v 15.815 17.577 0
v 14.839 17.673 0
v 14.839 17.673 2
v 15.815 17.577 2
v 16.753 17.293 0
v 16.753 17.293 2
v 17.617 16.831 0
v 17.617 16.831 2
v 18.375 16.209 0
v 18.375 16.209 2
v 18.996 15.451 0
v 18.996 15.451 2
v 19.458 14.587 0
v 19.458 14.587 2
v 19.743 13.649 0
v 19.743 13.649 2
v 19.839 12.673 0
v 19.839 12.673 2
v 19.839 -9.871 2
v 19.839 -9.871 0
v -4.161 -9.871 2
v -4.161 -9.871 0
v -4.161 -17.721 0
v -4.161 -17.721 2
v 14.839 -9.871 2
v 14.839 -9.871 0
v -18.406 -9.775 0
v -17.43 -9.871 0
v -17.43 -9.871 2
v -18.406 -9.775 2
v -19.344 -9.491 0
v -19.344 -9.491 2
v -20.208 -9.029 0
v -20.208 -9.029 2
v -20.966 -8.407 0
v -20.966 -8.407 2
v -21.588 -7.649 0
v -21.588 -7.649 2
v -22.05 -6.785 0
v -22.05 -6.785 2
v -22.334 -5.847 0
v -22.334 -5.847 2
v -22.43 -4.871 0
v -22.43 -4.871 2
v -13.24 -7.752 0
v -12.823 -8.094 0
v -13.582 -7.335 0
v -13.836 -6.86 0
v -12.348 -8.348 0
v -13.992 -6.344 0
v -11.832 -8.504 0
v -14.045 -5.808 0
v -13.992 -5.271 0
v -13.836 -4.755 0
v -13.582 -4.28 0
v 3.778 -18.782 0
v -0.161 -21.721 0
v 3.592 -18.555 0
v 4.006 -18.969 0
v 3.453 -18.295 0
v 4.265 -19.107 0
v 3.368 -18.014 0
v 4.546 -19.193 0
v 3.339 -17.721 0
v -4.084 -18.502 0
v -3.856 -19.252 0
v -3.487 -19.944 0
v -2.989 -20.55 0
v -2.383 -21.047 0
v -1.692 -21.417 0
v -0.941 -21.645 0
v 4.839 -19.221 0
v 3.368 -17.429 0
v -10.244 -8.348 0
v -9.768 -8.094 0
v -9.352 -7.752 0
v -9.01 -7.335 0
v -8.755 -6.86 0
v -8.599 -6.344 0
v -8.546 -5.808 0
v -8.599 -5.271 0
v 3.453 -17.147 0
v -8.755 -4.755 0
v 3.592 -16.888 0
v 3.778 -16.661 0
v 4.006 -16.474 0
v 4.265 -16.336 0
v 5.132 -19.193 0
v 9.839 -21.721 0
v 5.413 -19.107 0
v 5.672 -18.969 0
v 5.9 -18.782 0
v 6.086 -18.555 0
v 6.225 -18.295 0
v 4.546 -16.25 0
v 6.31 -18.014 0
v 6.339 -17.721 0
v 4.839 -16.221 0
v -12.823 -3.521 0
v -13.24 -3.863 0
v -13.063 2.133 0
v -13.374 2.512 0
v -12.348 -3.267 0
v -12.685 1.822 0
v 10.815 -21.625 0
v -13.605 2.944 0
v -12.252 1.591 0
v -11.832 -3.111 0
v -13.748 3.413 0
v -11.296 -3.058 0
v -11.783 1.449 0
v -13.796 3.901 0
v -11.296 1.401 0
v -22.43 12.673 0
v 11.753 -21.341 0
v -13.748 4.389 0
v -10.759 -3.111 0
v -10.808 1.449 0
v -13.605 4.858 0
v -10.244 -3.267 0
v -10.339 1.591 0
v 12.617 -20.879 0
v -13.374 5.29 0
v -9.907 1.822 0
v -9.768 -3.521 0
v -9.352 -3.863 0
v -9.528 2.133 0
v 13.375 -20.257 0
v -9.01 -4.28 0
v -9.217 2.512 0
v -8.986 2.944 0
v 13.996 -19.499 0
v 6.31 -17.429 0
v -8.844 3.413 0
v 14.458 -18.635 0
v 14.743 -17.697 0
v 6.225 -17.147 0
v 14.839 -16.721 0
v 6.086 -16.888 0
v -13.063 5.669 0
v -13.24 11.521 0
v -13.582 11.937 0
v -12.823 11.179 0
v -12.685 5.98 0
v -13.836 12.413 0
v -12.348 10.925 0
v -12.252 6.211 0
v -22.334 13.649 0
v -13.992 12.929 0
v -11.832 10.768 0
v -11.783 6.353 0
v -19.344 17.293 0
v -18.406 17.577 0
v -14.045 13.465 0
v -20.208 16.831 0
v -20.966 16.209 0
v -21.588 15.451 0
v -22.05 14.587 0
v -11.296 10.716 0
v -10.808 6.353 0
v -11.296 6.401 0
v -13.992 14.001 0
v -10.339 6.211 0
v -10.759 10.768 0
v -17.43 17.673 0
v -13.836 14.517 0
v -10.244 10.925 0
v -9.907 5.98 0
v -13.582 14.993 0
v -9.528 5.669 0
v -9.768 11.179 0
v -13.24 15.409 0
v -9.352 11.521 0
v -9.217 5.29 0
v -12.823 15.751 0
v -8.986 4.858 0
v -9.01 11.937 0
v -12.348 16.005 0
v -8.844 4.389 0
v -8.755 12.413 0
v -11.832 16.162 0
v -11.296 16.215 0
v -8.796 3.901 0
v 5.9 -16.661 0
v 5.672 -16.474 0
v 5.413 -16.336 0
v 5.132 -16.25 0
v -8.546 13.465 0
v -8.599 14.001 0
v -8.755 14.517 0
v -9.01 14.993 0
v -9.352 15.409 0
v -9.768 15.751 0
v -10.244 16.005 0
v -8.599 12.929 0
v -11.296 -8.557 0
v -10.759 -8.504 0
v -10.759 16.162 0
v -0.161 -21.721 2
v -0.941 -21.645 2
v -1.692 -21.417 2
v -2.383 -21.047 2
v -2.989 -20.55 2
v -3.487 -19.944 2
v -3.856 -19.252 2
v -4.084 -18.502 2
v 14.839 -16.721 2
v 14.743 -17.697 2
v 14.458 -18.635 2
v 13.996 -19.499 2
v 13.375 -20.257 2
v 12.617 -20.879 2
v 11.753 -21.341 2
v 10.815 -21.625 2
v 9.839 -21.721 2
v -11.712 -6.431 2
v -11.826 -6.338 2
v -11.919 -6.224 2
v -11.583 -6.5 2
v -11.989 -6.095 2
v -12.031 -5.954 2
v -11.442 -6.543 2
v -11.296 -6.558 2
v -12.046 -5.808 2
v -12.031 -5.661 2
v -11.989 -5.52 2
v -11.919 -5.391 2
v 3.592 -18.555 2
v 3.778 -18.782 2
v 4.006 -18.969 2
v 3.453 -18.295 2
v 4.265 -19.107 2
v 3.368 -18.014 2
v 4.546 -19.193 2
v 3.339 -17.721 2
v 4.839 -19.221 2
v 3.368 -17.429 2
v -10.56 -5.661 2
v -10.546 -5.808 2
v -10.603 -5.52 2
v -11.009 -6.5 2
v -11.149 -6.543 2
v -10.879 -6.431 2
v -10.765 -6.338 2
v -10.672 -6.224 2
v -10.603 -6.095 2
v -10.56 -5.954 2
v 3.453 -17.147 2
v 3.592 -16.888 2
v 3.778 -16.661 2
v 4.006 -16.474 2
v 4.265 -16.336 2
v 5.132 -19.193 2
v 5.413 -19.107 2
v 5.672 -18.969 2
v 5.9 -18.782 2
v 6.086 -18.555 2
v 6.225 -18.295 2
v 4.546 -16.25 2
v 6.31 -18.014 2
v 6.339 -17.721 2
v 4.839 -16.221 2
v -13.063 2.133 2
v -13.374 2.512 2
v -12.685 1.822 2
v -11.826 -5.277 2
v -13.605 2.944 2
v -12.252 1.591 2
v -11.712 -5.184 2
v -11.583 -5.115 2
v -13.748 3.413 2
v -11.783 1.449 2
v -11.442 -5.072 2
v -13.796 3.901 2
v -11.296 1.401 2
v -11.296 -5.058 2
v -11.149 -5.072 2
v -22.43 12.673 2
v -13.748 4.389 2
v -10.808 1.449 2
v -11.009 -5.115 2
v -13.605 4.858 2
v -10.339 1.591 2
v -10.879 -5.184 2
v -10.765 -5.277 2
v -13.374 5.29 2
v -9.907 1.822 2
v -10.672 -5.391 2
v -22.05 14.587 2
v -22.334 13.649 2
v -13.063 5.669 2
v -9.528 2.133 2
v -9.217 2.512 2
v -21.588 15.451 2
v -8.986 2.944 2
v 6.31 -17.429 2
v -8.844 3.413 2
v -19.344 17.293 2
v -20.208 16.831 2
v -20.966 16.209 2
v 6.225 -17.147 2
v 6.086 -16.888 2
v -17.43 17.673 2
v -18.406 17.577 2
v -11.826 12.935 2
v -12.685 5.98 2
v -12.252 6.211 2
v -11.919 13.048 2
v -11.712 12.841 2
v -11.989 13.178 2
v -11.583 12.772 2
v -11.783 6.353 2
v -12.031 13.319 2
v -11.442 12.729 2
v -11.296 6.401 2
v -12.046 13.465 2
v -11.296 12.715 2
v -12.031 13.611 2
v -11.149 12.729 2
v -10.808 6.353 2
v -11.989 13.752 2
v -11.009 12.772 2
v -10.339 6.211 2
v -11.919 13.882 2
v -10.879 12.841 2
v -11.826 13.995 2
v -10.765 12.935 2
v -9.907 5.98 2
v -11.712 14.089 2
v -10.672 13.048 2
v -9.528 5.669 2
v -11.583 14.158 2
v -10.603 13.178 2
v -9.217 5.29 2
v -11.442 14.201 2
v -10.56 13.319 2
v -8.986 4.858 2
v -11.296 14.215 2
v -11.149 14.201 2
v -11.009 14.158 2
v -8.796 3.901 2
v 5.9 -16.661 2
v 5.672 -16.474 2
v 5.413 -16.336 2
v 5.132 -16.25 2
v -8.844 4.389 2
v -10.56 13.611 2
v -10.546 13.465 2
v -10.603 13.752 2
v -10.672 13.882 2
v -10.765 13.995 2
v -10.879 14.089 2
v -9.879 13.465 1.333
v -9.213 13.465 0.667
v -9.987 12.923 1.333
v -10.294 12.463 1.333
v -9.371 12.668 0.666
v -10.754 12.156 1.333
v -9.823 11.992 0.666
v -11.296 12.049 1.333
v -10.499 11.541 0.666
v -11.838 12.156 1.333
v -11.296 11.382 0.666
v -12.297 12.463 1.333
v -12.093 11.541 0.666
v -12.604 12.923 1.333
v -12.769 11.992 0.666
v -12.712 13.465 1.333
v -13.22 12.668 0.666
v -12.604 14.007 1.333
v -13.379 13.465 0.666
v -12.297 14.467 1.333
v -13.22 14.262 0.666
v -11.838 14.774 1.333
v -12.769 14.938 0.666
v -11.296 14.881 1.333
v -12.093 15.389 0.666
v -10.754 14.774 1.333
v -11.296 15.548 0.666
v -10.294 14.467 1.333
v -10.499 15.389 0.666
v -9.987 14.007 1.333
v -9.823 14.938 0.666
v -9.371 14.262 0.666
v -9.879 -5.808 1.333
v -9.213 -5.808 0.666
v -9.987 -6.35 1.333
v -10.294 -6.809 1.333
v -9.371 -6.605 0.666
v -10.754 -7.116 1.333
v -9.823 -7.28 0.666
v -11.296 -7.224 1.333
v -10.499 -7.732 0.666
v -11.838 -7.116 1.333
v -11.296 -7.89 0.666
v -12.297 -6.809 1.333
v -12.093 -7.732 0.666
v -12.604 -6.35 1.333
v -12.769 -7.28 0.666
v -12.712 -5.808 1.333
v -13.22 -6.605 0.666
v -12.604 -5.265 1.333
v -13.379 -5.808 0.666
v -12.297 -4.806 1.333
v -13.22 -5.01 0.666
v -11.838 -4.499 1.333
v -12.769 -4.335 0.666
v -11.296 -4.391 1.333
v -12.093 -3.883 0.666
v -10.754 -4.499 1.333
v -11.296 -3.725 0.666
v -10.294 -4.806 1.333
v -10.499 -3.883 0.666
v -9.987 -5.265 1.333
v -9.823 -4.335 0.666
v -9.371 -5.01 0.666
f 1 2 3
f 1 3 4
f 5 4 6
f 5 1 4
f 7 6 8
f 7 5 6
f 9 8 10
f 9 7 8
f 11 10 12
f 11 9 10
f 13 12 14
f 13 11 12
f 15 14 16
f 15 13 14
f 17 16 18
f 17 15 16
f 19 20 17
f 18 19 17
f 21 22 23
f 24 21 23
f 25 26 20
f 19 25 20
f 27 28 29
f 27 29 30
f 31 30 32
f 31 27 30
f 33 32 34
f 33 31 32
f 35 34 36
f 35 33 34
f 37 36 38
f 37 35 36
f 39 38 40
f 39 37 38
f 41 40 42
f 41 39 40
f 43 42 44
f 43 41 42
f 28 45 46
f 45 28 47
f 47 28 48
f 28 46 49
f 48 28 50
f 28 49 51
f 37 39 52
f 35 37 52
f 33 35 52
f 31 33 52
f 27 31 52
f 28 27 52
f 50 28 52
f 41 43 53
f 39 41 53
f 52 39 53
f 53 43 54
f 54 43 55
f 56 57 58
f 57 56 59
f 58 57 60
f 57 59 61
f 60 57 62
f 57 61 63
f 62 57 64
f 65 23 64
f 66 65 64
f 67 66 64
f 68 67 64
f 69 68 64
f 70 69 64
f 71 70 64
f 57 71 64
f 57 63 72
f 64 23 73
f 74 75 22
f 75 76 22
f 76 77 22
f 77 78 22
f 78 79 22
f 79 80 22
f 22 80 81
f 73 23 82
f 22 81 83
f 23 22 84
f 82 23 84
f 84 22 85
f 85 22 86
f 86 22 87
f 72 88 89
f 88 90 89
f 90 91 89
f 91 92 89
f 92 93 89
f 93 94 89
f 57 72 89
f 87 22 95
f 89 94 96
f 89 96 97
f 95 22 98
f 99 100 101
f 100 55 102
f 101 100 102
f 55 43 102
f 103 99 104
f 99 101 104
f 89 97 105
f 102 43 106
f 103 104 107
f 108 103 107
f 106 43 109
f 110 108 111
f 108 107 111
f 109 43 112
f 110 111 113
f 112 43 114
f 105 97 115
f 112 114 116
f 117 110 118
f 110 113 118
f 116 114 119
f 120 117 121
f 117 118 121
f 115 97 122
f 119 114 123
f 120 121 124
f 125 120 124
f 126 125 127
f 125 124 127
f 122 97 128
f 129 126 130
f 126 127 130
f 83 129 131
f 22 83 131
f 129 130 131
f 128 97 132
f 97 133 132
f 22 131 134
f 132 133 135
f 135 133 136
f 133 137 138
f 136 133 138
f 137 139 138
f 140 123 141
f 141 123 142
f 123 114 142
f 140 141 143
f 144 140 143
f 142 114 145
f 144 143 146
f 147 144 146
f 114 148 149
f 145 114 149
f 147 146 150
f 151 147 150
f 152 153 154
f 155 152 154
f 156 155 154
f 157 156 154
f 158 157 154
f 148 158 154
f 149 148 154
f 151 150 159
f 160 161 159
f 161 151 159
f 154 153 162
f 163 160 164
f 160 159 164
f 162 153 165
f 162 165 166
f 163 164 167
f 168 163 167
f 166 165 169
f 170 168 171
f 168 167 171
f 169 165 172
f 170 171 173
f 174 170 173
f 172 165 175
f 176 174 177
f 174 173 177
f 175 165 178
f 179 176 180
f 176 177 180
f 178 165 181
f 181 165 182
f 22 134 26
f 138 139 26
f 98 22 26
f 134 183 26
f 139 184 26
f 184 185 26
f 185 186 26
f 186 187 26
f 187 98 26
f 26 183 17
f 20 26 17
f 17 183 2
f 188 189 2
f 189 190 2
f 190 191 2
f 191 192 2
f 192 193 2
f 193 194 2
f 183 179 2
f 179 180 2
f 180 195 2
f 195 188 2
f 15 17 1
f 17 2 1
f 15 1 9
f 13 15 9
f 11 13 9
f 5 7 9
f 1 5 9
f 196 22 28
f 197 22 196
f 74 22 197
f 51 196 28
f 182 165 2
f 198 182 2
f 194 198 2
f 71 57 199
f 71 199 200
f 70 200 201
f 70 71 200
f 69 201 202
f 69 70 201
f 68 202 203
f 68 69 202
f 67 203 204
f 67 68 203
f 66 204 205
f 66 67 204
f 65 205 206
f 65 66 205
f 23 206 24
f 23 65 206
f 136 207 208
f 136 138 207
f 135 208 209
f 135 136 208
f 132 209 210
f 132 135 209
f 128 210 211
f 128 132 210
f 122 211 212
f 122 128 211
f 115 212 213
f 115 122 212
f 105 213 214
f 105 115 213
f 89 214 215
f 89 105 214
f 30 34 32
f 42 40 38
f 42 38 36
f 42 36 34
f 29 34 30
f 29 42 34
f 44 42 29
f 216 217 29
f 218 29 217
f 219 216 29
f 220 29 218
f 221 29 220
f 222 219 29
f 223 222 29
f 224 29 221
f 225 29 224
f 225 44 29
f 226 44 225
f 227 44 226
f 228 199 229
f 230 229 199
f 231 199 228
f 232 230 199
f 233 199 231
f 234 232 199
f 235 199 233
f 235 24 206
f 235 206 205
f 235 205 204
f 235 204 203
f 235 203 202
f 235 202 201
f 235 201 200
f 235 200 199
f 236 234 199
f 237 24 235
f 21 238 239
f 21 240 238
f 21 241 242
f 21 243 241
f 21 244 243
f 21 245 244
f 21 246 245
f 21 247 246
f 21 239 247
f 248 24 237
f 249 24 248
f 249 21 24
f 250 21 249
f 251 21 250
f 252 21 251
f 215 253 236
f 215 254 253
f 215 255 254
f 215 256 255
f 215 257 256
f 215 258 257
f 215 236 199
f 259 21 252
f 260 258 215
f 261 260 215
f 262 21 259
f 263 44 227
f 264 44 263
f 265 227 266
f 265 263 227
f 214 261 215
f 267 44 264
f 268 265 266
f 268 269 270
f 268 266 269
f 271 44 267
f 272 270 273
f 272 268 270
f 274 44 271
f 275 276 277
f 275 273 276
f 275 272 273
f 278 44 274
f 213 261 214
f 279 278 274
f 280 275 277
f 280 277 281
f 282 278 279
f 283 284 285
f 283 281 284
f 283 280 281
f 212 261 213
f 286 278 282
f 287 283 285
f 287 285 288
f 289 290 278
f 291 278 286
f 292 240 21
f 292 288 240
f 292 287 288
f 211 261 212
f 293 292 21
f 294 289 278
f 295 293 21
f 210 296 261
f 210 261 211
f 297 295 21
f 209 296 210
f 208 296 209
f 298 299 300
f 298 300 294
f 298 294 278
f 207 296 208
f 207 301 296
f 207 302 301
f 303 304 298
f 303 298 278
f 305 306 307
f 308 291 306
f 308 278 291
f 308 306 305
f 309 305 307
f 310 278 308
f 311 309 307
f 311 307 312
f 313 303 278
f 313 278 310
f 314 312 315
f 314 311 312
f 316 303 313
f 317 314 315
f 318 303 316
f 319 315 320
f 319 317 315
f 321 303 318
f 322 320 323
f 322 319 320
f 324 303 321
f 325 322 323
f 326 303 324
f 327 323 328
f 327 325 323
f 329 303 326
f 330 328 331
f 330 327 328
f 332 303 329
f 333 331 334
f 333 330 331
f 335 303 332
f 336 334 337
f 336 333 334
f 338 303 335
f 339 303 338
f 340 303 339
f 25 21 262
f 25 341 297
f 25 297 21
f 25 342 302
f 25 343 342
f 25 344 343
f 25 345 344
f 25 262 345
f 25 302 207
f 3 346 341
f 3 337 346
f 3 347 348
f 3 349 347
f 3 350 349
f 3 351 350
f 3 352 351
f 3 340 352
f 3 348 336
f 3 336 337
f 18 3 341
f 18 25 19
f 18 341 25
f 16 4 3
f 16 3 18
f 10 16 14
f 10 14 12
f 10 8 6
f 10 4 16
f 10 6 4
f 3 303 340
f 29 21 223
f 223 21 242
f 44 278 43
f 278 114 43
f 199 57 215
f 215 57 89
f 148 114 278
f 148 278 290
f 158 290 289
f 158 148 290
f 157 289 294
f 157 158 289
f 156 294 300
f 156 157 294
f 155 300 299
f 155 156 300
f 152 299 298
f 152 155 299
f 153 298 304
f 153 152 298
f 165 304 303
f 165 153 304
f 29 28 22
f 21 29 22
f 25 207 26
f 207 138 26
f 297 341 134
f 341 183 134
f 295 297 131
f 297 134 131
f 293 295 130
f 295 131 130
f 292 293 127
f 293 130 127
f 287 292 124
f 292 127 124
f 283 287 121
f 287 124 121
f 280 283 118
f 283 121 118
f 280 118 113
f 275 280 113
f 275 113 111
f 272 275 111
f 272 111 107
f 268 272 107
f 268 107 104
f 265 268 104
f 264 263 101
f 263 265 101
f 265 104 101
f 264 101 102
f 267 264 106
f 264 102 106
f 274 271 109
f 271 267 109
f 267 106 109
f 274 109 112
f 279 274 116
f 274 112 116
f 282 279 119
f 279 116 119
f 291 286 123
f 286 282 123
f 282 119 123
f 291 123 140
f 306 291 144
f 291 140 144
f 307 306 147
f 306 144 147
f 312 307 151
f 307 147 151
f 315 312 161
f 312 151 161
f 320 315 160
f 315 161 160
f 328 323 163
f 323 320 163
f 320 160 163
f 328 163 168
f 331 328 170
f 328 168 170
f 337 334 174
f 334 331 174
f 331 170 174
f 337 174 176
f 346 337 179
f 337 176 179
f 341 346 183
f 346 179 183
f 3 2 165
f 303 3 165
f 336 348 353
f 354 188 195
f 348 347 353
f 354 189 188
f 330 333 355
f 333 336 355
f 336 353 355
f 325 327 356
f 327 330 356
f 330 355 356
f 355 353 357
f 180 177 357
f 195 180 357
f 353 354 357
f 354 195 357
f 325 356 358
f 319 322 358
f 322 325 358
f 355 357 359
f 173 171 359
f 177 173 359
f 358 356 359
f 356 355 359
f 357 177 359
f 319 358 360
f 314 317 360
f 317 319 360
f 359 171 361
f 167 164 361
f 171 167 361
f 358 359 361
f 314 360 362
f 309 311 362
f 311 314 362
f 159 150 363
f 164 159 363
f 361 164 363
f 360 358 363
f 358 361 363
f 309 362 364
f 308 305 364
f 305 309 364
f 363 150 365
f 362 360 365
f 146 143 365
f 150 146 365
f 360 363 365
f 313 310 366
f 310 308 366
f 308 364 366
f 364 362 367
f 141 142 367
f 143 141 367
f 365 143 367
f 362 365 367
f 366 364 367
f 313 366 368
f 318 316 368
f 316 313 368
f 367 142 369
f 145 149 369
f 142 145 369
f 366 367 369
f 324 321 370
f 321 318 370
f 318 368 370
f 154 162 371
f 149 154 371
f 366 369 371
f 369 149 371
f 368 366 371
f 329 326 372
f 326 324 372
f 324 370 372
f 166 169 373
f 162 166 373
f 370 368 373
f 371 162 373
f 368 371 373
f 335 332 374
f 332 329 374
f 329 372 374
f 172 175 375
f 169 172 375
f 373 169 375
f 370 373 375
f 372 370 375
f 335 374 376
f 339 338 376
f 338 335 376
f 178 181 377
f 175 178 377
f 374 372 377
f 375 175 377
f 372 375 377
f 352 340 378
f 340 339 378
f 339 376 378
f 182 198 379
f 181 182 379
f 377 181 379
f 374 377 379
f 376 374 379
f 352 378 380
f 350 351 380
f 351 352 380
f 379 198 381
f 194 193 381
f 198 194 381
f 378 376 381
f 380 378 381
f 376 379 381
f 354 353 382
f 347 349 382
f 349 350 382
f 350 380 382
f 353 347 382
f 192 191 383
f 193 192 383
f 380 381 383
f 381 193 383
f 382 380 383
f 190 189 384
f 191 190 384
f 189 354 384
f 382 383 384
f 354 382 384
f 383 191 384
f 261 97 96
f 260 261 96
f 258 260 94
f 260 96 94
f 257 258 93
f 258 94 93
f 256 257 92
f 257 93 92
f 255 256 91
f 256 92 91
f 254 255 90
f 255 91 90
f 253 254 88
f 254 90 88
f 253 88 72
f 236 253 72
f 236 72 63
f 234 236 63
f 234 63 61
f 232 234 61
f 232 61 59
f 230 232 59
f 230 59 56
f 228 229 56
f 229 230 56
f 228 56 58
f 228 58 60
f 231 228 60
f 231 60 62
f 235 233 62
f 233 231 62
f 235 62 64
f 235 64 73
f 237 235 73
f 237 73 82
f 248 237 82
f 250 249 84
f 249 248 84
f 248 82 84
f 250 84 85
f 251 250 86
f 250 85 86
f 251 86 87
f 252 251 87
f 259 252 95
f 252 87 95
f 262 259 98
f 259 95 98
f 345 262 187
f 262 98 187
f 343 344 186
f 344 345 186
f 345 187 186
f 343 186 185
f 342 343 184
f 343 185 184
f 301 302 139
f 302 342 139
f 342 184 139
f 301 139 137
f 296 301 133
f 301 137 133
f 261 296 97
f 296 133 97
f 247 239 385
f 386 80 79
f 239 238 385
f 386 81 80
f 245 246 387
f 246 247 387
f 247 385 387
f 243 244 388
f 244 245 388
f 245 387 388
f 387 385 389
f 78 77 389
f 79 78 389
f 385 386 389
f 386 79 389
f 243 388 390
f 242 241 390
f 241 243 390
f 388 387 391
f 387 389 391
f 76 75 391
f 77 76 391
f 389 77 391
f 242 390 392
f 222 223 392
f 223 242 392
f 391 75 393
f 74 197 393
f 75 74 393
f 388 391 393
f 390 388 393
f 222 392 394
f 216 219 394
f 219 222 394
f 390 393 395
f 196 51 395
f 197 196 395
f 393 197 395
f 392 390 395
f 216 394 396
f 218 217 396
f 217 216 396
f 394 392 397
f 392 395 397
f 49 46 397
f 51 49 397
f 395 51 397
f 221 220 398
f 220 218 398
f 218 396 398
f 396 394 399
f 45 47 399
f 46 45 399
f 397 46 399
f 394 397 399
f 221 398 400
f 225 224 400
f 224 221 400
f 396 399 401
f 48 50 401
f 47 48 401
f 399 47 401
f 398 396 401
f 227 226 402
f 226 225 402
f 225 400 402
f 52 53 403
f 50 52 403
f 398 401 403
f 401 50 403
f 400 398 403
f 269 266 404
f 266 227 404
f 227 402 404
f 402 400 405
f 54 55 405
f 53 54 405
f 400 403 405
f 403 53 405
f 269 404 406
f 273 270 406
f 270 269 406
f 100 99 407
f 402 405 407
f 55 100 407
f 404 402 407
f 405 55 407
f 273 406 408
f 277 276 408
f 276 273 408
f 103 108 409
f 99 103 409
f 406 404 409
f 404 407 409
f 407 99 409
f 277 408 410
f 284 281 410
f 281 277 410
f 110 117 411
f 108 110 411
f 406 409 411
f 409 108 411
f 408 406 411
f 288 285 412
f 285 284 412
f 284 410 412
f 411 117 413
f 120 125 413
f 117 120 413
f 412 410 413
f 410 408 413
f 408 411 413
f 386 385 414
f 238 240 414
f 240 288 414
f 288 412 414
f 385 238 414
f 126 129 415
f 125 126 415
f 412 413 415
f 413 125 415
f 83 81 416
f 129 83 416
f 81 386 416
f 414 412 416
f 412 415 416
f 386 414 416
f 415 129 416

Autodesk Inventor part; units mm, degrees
ref_plane "YZ Plane" through (0, 0, 0) normal (1, 0, 0) x (0, 1, 0)
ref_plane "XZ Plane" through (0, 0, 0) normal (0, 1, 0) x (-1, 0, 0)
ref_plane "XY Plane" through (0, 0, 0) normal (0, 0, 1) x (1, 0, 0)
sketch "Эскиз1" plane through (0, 0, 0) normal (0, 0, 1) x (1, 0, 0)
  arc A0 (-17.4305, 17.6734) -> (-22.4305, 12.6734) centre (-17.4305, 12.6734) ccw
  line L0 (-22.4305, 12.6734) -> (-22.4305, -4.8714)
  arc A1 (-22.4305, -4.8714) -> (-17.4305, -9.8714) centre (-17.4305, -4.8714) ccw
  line L1 (-17.4305, -9.8714) -> (-4.1609, -9.8714)
  line L2 (-4.1609, -9.8714) -> (-4.1609, -17.7214)
  arc A2 (-4.1609, -17.7214) -> (-0.1609, -21.7214) centre (-0.1609, -17.7214) ccw
  line L3 (-0.1609, -21.7214) -> (9.8391, -21.7214)
  arc A3 (9.8391, -21.7214) -> (14.8391, -16.7214) centre (9.8391, -16.7214) ccw
  line L4 (14.8391, -16.7214) -> (14.8391, -9.8714)
  line L5 (19.8391, -9.8714) -> (19.8391, 12.6734)
  arc A4 (19.8391, 12.6734) -> (14.8391, 17.6734) centre (14.8391, 12.6734) ccw
  line L6 (14.8391, 17.6734) -> (-17.4305, 17.6734)
  circle A5 centre (-11.2957, 3.901) radius 2.5
  circle A6 centre (4.8391, -17.7214) radius 1.5
  line L7 (14.8391, -9.8714) -> (19.8391, -9.8714)
  circle A7 centre (-11.2957, 13.465) radius 0.75
  circle A8 centre (-11.2957, -5.8075) radius 0.75
  point P0 (0, 0)
  dimension "d0" = 5
extrude "Выдавливание1" add sketch "Эскиз1" along normal blind 2
chamfer "Фаска3" distance 2 angle 45 1 edges at (-12.0457, -5.8075, 0)
chamfer "Фаска4" distance 2 angle 45 1 edges at (-12.0457, 13.465, 0)
properties part number "Верт держатели-2 правый"
